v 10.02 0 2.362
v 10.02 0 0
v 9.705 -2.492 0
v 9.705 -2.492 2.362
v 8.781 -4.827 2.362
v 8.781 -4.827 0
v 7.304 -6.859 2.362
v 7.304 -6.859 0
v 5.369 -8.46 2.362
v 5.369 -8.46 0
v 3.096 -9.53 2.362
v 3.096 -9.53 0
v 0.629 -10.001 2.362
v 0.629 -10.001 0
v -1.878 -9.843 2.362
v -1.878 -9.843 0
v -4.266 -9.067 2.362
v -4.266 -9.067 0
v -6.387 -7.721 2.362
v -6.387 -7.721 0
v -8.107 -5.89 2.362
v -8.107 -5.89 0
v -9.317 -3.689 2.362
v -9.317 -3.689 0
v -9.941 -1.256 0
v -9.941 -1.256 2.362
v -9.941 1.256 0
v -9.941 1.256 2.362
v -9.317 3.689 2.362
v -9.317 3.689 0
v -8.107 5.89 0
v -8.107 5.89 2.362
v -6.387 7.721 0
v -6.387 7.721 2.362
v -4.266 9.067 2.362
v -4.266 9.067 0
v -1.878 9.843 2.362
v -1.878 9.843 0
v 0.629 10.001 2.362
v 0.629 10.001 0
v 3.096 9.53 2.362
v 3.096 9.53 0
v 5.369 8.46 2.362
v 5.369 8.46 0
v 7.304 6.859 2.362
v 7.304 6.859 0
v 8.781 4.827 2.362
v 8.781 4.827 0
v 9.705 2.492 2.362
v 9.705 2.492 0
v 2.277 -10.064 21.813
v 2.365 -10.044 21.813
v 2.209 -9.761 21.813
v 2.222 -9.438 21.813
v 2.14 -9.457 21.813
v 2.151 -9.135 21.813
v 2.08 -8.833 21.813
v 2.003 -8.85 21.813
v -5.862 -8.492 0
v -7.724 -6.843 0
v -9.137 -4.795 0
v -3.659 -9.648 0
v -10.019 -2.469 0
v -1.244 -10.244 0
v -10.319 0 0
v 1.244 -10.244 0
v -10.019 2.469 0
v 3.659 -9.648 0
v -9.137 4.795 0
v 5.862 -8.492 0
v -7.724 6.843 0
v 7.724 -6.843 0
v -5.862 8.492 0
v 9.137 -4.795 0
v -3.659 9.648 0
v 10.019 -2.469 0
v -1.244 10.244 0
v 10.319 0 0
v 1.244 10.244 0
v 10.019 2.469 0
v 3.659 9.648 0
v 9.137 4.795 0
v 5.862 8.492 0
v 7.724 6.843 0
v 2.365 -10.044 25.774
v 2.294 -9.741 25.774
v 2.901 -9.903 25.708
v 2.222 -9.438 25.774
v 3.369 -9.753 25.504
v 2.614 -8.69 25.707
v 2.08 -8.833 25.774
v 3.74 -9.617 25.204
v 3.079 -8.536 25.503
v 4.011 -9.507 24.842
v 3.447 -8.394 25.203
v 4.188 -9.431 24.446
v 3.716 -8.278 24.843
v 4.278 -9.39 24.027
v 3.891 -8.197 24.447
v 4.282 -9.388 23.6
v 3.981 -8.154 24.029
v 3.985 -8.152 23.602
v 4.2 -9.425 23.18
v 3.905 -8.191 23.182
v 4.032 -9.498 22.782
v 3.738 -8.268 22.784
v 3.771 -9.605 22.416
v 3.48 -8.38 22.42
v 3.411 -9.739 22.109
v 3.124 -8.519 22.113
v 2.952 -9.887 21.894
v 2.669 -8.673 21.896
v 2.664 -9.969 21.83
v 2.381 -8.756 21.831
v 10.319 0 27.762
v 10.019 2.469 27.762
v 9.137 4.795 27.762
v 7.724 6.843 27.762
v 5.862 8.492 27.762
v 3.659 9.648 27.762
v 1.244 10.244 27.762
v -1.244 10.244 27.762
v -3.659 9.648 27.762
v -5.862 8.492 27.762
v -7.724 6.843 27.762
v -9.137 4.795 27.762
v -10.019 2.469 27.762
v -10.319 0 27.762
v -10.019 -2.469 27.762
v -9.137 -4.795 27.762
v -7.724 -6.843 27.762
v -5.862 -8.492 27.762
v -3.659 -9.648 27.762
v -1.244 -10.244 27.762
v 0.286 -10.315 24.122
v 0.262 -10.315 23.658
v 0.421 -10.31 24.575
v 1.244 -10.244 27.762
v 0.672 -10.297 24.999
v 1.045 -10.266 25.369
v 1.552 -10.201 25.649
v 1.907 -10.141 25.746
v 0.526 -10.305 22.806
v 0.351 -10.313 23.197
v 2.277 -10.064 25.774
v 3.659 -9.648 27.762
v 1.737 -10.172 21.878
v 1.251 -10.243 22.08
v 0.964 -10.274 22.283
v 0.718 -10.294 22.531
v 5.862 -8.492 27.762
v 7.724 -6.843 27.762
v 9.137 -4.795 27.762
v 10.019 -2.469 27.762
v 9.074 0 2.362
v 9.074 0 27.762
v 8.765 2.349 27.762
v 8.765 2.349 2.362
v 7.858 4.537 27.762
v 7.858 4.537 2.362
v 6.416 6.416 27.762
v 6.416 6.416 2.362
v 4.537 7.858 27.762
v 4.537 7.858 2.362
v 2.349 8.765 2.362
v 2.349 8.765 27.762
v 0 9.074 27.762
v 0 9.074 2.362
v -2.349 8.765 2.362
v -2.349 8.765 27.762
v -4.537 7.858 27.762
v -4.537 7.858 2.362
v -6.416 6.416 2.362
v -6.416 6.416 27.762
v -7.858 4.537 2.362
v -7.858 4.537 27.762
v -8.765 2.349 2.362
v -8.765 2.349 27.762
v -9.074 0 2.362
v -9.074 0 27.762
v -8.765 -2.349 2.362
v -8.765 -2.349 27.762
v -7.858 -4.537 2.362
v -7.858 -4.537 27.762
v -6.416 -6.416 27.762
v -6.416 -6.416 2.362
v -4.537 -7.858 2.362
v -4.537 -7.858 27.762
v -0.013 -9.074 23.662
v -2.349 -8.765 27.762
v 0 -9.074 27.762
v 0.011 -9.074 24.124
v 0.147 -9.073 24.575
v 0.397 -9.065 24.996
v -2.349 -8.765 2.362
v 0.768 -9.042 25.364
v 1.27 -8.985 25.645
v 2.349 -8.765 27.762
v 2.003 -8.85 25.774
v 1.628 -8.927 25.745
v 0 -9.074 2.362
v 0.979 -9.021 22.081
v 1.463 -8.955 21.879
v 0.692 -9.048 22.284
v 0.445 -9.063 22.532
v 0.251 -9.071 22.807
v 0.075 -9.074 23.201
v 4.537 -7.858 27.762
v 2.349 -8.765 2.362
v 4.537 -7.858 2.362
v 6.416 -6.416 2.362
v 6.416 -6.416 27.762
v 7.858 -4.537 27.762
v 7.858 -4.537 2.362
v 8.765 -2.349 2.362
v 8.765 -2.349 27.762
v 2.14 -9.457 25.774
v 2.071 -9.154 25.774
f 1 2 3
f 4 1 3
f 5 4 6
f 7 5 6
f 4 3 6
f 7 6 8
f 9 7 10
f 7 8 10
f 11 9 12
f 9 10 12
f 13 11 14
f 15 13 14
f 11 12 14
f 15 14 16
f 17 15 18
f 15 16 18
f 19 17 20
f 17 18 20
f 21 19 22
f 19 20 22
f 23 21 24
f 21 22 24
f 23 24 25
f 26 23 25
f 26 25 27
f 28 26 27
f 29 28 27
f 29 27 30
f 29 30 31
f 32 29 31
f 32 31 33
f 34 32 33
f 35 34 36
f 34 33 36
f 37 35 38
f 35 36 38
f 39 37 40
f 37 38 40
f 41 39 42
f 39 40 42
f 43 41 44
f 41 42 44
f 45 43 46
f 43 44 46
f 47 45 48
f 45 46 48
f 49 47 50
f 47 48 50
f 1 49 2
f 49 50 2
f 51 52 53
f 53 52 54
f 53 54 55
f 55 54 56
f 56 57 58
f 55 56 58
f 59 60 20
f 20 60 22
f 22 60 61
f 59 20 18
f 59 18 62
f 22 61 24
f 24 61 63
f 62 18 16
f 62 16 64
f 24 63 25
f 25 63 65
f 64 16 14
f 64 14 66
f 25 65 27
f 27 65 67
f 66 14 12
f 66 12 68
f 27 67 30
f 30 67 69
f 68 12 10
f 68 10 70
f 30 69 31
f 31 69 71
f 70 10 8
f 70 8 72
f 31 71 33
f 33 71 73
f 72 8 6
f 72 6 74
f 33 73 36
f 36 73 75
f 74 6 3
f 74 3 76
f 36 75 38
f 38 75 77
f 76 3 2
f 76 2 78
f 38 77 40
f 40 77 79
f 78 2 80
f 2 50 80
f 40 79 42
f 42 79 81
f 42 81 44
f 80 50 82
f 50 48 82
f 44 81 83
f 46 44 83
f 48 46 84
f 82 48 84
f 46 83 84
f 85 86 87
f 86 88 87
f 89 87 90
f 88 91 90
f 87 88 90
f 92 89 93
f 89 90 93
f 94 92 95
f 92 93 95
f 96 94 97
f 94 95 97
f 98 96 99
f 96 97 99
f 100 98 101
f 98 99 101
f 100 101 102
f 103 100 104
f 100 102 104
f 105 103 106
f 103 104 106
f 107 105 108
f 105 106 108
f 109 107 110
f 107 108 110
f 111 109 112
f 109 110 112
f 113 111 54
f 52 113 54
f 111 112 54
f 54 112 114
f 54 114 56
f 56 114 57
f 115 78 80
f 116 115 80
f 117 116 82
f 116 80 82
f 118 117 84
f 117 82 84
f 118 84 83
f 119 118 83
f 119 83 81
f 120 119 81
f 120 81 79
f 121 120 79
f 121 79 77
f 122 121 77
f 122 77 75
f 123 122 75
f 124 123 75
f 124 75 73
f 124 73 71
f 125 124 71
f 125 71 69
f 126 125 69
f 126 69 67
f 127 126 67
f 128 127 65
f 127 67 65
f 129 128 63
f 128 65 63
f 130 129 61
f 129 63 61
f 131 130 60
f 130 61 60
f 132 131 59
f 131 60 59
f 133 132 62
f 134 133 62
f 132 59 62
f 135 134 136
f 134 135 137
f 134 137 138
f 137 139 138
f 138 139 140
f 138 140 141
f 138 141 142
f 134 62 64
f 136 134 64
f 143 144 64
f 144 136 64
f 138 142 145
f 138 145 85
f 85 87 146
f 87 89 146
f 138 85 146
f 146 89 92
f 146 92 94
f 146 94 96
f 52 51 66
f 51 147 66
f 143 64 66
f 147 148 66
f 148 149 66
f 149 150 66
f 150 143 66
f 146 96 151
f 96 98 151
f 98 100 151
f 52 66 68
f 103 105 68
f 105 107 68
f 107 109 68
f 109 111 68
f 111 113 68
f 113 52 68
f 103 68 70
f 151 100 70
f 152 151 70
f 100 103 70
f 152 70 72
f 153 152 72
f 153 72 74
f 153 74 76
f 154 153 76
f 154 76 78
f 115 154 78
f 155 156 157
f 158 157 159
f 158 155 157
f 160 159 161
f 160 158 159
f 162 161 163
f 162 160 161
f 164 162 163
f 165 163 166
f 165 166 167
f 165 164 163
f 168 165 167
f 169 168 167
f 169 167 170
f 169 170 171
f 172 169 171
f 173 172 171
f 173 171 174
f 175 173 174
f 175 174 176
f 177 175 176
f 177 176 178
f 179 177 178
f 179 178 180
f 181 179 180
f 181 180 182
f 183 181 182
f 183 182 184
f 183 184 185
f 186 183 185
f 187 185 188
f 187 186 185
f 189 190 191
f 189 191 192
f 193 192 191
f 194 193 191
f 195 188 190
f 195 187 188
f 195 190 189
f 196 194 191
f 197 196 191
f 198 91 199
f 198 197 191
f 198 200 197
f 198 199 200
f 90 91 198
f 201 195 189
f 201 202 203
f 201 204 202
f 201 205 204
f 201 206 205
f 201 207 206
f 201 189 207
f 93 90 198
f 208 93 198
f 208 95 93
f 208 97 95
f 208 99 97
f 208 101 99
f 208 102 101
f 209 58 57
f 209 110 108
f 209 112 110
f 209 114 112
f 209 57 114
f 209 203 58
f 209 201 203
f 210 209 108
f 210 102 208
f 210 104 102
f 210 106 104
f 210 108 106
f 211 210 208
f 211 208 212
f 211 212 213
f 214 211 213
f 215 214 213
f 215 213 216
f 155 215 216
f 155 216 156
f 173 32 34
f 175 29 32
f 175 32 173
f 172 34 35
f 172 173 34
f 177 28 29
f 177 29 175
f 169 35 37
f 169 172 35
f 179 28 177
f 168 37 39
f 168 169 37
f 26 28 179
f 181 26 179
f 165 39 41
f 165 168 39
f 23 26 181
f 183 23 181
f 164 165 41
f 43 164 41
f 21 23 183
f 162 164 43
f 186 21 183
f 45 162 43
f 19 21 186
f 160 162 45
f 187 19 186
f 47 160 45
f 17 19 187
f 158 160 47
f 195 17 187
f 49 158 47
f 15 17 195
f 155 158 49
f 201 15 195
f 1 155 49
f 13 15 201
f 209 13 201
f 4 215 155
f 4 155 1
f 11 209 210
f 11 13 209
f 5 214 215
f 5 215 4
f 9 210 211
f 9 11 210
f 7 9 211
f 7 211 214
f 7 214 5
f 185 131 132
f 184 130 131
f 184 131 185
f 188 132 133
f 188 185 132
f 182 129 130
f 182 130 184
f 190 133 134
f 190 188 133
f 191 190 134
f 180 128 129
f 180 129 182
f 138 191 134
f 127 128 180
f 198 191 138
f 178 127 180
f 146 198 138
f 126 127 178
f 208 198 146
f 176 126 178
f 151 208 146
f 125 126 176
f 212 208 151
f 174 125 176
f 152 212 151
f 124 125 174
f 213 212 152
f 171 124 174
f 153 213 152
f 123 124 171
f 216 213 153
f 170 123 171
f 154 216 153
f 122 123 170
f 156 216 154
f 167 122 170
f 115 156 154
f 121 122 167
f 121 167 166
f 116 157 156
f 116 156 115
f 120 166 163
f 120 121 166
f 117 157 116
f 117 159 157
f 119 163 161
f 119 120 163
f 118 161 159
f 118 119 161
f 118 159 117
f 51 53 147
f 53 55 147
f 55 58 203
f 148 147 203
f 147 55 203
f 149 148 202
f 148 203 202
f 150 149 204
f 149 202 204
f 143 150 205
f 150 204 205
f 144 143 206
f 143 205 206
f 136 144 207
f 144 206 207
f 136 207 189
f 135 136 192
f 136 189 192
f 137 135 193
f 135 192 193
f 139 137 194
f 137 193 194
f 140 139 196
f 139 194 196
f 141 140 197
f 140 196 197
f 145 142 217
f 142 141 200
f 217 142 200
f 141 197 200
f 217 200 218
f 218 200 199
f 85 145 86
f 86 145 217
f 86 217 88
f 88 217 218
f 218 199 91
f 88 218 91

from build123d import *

# Parameters (mm, degrees)
F0_R      = 10.31875
F1_DEPTH  = 27.7622
F2_T      = -1.2446
F3_R      = 10.0203
F4_DEPTH  = 2.3622
F8_R      = 1.9812
F9_DEPTH  = 12.443506
F10_R     = 1.9812
F11_DEPTH = 12.308541
F13_R     = 1.9812
F14_DEPTH = 12.376495


with BuildPart() as f1:
    # F0 (on Top) → F1 (new body)
    with BuildSketch(Plane.XY):
        Circle(F0_R)
    extrude(amount=F1_DEPTH)

    # F2
    f2_openings = [f1.faces().sort_by_distance(p)[0] for p in [
        (0, 0, 27.7622),
        (0, 0, 0),
    ]]
    offset(amount=F2_T, openings=f2_openings)

    # F3 (on face) → F4 (cut)
    with BuildSketch(Plane(origin=(0, 0, 0), x_dir=(1, 0, 0), z_dir=(0, 0, -1))):
        Circle(F3_R)
    extrude(amount=-F4_DEPTH, mode=Mode.SUBTRACT)

    # F8 (on face) → F9 (cut, through all)
    with BuildSketch(Plane(origin=(0, 0, 0), x_dir=(-0.97237, -0.233445, 0), z_dir=(-0.233445, 0.97237, 0))):
        with Locations((0, 23.79345)):
            Circle(F8_R)
    extrude(amount=-F9_DEPTH, mode=Mode.SUBTRACT)

    # F10 (on face) → F11 (cut, through all)
    with BuildSketch(Plane(origin=(0, 0, 0), x_dir=(-0.976296, -0.21644, 0), z_dir=(-0.21644, 0.976296, 0))):
        with Locations((0, 23.79345)):
            Circle(F10_R)
    extrude(amount=-F11_DEPTH, mode=Mode.SUBTRACT)

    # F13 (on face) → F14 (cut, through all)
    with BuildSketch(Plane(origin=(0, 0, 0), x_dir=(-0.97437, -0.224951, 0), z_dir=(-0.224951, 0.97437, 0))):
        with Locations((0, 23.79345)):
            Circle(F13_R)
    extrude(amount=-F14_DEPTH, mode=Mode.SUBTRACT)


solid = f1.part
